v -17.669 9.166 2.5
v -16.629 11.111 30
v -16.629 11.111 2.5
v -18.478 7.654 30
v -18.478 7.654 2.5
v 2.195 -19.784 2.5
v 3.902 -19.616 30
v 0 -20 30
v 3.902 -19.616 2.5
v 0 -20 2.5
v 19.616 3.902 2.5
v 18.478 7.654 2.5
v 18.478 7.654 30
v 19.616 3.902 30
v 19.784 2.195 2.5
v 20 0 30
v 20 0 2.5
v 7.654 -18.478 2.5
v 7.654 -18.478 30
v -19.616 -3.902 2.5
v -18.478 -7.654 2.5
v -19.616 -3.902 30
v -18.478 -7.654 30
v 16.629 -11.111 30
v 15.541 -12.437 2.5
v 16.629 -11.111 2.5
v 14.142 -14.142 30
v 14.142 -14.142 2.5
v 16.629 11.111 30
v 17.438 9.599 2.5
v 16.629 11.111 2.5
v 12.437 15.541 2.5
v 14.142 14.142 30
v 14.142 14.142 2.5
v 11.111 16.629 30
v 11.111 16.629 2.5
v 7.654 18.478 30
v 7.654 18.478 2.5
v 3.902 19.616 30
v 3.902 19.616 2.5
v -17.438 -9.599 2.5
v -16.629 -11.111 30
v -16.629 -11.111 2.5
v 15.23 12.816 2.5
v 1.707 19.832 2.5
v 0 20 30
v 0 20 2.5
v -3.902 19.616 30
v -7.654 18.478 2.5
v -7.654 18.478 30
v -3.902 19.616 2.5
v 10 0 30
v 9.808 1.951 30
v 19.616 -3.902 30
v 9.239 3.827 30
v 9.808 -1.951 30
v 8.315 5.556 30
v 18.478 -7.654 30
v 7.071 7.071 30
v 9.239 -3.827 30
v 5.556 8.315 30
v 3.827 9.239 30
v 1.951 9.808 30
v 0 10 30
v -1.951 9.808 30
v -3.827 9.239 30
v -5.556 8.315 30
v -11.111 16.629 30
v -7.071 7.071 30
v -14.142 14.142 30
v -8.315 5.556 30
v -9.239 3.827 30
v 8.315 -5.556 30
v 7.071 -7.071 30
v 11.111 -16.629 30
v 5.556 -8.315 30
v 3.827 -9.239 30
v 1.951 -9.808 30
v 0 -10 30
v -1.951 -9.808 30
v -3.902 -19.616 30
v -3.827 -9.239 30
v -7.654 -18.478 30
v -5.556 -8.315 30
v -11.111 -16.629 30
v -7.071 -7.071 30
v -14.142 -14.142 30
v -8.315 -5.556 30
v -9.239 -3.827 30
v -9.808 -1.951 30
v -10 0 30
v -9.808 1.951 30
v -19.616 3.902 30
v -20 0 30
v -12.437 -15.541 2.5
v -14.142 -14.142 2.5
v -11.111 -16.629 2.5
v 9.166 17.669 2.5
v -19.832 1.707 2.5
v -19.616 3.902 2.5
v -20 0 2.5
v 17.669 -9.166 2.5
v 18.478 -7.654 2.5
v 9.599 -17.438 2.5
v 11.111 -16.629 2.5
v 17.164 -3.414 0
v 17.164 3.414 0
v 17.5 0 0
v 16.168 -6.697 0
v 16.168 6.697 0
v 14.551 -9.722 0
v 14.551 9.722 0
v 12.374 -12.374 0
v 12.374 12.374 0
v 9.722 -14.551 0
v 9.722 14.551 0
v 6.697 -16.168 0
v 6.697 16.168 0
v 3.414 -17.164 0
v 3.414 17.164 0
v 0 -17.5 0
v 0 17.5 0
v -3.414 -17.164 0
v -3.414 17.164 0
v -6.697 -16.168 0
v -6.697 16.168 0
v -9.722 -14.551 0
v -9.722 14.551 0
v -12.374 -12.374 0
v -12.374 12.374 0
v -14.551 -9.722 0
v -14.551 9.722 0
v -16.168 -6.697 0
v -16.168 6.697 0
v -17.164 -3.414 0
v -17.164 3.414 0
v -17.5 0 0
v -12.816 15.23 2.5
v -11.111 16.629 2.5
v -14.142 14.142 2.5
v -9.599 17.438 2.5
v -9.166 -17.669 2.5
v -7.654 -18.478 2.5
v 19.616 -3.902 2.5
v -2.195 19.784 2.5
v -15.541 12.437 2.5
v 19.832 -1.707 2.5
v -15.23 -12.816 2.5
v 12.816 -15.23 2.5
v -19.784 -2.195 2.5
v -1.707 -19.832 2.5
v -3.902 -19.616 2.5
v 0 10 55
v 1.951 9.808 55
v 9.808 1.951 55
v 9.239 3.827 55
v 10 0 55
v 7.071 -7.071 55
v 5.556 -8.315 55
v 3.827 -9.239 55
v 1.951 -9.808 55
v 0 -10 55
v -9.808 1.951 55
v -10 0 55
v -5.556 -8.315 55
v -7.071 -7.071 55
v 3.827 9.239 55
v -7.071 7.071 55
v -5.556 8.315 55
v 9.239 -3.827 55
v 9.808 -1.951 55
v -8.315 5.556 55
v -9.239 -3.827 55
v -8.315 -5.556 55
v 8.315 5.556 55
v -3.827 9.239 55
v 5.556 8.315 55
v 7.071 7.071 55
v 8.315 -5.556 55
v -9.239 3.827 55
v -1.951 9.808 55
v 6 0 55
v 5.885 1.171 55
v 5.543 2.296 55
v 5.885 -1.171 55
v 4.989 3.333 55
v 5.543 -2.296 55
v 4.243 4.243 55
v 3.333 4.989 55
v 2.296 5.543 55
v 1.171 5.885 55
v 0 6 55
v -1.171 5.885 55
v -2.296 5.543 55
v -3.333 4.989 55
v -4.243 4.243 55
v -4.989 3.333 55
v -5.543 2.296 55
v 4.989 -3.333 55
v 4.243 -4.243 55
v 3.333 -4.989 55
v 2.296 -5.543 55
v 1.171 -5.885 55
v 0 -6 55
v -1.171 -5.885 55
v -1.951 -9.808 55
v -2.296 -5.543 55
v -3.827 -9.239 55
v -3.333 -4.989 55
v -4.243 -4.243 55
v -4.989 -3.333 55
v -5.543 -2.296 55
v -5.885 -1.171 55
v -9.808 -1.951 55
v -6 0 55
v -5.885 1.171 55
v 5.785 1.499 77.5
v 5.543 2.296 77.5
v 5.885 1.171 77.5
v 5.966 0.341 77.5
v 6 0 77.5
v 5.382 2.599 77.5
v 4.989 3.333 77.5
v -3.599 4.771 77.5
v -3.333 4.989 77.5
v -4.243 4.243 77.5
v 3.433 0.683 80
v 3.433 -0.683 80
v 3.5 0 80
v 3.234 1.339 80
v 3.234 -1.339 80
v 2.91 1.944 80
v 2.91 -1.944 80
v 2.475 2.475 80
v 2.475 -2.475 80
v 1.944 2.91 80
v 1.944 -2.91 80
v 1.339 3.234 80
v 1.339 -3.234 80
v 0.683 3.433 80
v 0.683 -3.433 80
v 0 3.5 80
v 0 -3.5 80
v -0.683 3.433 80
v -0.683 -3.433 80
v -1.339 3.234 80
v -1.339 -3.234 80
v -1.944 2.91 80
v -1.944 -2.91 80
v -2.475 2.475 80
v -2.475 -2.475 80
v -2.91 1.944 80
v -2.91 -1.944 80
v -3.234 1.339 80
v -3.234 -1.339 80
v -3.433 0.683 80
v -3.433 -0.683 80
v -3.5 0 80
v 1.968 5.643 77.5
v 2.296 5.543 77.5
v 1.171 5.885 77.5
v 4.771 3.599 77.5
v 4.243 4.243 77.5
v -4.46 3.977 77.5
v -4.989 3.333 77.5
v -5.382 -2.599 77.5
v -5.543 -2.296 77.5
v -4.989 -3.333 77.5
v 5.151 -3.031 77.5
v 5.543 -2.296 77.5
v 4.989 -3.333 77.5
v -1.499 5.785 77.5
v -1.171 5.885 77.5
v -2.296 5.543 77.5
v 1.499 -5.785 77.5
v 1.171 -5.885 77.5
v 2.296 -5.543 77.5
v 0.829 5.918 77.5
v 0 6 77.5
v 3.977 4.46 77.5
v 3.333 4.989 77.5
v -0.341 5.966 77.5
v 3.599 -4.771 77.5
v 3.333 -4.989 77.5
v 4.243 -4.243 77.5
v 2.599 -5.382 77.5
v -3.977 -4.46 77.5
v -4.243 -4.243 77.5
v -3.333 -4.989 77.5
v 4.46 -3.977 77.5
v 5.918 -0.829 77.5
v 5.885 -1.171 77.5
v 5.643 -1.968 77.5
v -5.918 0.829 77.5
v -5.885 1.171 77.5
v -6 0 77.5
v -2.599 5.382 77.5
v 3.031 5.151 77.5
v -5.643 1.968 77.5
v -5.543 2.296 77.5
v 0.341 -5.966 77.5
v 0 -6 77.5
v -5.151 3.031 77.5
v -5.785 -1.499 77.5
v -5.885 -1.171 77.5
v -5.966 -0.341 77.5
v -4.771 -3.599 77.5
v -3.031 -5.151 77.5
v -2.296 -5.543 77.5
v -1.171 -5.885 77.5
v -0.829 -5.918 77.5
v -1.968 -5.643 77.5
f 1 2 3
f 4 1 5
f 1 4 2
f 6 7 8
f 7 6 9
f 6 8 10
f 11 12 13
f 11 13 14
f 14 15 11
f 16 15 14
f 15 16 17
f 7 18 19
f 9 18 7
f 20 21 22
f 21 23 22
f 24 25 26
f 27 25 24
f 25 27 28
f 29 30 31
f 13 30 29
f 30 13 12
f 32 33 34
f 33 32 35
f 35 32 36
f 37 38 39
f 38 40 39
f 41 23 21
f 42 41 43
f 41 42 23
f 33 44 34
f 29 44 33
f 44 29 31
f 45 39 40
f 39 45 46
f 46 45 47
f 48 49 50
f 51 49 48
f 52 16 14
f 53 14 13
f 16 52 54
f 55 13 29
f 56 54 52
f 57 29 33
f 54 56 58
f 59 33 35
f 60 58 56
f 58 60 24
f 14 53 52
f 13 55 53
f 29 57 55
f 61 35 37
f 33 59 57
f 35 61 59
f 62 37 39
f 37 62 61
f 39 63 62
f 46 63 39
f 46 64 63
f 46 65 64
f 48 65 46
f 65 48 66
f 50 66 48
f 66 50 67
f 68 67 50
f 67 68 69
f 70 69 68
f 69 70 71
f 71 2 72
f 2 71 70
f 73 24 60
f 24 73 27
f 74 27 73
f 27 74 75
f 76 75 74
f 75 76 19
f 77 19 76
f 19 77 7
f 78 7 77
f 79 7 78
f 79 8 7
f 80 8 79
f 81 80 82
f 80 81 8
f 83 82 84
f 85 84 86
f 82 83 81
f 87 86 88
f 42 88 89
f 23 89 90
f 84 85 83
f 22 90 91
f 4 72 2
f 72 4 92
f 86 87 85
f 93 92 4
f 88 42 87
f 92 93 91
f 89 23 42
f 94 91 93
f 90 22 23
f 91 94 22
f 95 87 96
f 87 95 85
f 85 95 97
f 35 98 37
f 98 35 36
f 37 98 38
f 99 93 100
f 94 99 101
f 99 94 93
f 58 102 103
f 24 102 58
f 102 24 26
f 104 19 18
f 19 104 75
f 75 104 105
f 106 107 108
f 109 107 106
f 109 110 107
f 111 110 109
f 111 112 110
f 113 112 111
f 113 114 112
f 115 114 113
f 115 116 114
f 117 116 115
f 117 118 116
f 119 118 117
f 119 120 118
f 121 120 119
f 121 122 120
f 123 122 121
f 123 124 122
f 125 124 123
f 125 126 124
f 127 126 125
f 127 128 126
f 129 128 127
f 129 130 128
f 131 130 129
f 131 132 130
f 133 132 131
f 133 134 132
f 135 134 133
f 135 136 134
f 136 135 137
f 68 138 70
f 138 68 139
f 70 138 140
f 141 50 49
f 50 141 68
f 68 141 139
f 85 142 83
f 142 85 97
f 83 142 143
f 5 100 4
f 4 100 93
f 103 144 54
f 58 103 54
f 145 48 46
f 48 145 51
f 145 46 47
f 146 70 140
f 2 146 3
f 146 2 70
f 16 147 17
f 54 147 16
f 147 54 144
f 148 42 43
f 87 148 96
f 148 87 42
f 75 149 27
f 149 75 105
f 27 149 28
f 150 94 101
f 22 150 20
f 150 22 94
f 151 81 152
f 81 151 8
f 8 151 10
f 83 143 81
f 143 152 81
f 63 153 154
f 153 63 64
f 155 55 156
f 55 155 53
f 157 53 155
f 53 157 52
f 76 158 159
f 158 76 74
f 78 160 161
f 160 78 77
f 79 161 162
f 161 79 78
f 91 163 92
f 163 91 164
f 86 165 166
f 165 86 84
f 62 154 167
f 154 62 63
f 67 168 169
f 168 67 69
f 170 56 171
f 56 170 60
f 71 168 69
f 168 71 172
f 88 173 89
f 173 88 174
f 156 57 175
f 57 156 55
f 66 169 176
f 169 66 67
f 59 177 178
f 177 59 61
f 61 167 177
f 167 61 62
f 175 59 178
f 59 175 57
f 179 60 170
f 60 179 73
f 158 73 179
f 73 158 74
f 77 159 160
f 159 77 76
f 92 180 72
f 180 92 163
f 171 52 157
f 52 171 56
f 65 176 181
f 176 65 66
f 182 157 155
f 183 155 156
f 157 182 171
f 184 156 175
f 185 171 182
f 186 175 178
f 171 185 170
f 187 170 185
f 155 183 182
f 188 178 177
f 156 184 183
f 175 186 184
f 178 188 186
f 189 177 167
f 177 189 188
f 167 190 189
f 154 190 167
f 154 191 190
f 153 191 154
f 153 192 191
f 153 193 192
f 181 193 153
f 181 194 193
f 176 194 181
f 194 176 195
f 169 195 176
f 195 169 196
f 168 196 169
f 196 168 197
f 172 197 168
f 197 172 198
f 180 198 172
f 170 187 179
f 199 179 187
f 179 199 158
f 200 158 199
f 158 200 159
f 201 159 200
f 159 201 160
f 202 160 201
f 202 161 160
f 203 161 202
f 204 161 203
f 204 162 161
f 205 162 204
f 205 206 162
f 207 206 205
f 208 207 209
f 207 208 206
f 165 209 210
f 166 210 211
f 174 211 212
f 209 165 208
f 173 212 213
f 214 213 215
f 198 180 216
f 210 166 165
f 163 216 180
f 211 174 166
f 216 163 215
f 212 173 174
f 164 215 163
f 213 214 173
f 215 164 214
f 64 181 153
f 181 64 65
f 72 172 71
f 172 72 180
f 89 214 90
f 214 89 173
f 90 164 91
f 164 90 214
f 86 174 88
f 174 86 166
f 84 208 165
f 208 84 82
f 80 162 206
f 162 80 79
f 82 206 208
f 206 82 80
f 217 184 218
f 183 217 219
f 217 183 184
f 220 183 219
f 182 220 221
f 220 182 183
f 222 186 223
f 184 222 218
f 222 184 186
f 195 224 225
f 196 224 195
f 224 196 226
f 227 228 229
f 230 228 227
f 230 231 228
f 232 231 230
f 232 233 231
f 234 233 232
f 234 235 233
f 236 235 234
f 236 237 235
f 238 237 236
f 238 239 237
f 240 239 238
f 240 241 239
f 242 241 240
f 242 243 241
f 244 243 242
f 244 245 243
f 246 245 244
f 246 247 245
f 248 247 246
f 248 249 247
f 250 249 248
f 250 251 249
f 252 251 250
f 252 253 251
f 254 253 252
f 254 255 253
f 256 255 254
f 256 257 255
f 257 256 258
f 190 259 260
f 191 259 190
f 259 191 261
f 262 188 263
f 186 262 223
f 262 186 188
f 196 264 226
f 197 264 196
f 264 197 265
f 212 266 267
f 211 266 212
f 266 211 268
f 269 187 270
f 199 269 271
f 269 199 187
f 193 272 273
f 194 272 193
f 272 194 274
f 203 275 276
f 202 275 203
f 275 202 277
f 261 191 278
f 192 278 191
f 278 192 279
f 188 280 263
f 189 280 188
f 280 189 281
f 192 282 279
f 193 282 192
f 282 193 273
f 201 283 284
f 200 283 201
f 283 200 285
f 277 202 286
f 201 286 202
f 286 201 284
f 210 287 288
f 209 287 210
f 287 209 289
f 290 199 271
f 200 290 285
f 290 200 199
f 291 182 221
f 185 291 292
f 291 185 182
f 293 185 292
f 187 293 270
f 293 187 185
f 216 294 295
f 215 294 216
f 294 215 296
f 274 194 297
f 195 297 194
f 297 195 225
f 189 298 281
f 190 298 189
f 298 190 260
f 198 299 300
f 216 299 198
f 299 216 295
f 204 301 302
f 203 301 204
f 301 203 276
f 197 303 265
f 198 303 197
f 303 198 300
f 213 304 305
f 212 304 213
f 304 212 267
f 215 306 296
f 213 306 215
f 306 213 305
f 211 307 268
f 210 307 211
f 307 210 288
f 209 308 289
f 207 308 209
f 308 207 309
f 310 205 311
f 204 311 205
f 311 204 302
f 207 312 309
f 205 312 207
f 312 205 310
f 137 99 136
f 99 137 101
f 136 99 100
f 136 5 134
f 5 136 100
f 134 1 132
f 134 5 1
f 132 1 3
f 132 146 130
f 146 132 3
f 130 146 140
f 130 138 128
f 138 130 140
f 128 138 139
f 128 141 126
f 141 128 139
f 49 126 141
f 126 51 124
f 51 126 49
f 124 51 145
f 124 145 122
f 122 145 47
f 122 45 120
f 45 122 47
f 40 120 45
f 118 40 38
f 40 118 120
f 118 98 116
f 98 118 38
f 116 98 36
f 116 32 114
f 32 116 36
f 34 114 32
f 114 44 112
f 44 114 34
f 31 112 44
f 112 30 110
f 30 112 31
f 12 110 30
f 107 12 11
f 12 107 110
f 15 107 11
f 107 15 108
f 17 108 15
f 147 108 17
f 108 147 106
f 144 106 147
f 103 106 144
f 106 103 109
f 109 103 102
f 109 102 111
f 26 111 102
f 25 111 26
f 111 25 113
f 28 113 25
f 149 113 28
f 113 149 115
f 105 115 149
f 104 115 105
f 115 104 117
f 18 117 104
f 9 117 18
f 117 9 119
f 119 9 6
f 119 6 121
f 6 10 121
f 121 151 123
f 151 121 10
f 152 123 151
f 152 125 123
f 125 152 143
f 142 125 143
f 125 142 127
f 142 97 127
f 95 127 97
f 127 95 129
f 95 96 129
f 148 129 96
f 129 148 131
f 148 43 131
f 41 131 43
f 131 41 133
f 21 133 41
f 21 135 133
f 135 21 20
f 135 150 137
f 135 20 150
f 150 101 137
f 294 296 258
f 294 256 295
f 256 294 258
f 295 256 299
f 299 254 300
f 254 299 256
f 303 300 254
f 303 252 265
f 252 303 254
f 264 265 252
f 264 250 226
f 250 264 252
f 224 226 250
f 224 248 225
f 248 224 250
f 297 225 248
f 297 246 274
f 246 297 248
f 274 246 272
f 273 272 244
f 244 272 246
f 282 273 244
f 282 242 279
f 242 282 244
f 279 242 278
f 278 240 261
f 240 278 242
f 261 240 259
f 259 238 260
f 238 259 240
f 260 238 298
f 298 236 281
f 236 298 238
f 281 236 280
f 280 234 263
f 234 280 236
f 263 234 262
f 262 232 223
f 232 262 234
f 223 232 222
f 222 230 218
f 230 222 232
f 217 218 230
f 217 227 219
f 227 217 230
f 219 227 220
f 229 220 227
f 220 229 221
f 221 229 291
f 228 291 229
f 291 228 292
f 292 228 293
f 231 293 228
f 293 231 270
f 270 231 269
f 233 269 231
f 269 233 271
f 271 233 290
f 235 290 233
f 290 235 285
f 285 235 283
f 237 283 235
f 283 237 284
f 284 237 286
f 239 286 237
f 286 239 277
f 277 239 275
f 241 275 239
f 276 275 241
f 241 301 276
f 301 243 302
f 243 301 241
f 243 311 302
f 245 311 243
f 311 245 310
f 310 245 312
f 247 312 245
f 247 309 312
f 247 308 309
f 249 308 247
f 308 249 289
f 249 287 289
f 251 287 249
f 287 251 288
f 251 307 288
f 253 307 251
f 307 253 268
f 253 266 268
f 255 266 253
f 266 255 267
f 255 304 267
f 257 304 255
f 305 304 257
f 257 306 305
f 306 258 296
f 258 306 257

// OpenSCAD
$fn = 32;

// ----------------------------------------------------------------------
// Stepped shaft: diameters 40, 20, 12 mm, 80 mm long
// ----------------------------------------------------------------------

// --- parameters (mm) ---
d1 = 40;                  // step 1 diameter
len1 = 30;                // step 1 length
d2 = 20;                  // step 2 diameter
len2 = 25;                // step 2 length
d3 = 12;                  // step 3 diameter
len3 = 25;                // step 3 length
total = 80;               // overall length
chamfer = 2.5;            // end chamfer

difference() {
  /* turned body: stacked cylinders, every step sunk into the bigger one */
  union() {
    cylinder(h = len1, d = d1);
    translate([0, 0, 29.6]) cylinder(h = 25.4, d = d2);
    translate([0, 0, 54.6]) cylinder(h = 25.4, d = d3);
  }
  /* bottom chamfer ring cut */
  rotate_extrude() translate([17.5, -2.5]) polygon([[0, 0], [5, 0], [5, 7.5], [0, 2.5]]);
  /* top chamfer ring cut */
  rotate_extrude() translate([3.5, 80]) polygon([[0, 0], [5, -5], [5, 2.5], [0, 2.5]]);
}
